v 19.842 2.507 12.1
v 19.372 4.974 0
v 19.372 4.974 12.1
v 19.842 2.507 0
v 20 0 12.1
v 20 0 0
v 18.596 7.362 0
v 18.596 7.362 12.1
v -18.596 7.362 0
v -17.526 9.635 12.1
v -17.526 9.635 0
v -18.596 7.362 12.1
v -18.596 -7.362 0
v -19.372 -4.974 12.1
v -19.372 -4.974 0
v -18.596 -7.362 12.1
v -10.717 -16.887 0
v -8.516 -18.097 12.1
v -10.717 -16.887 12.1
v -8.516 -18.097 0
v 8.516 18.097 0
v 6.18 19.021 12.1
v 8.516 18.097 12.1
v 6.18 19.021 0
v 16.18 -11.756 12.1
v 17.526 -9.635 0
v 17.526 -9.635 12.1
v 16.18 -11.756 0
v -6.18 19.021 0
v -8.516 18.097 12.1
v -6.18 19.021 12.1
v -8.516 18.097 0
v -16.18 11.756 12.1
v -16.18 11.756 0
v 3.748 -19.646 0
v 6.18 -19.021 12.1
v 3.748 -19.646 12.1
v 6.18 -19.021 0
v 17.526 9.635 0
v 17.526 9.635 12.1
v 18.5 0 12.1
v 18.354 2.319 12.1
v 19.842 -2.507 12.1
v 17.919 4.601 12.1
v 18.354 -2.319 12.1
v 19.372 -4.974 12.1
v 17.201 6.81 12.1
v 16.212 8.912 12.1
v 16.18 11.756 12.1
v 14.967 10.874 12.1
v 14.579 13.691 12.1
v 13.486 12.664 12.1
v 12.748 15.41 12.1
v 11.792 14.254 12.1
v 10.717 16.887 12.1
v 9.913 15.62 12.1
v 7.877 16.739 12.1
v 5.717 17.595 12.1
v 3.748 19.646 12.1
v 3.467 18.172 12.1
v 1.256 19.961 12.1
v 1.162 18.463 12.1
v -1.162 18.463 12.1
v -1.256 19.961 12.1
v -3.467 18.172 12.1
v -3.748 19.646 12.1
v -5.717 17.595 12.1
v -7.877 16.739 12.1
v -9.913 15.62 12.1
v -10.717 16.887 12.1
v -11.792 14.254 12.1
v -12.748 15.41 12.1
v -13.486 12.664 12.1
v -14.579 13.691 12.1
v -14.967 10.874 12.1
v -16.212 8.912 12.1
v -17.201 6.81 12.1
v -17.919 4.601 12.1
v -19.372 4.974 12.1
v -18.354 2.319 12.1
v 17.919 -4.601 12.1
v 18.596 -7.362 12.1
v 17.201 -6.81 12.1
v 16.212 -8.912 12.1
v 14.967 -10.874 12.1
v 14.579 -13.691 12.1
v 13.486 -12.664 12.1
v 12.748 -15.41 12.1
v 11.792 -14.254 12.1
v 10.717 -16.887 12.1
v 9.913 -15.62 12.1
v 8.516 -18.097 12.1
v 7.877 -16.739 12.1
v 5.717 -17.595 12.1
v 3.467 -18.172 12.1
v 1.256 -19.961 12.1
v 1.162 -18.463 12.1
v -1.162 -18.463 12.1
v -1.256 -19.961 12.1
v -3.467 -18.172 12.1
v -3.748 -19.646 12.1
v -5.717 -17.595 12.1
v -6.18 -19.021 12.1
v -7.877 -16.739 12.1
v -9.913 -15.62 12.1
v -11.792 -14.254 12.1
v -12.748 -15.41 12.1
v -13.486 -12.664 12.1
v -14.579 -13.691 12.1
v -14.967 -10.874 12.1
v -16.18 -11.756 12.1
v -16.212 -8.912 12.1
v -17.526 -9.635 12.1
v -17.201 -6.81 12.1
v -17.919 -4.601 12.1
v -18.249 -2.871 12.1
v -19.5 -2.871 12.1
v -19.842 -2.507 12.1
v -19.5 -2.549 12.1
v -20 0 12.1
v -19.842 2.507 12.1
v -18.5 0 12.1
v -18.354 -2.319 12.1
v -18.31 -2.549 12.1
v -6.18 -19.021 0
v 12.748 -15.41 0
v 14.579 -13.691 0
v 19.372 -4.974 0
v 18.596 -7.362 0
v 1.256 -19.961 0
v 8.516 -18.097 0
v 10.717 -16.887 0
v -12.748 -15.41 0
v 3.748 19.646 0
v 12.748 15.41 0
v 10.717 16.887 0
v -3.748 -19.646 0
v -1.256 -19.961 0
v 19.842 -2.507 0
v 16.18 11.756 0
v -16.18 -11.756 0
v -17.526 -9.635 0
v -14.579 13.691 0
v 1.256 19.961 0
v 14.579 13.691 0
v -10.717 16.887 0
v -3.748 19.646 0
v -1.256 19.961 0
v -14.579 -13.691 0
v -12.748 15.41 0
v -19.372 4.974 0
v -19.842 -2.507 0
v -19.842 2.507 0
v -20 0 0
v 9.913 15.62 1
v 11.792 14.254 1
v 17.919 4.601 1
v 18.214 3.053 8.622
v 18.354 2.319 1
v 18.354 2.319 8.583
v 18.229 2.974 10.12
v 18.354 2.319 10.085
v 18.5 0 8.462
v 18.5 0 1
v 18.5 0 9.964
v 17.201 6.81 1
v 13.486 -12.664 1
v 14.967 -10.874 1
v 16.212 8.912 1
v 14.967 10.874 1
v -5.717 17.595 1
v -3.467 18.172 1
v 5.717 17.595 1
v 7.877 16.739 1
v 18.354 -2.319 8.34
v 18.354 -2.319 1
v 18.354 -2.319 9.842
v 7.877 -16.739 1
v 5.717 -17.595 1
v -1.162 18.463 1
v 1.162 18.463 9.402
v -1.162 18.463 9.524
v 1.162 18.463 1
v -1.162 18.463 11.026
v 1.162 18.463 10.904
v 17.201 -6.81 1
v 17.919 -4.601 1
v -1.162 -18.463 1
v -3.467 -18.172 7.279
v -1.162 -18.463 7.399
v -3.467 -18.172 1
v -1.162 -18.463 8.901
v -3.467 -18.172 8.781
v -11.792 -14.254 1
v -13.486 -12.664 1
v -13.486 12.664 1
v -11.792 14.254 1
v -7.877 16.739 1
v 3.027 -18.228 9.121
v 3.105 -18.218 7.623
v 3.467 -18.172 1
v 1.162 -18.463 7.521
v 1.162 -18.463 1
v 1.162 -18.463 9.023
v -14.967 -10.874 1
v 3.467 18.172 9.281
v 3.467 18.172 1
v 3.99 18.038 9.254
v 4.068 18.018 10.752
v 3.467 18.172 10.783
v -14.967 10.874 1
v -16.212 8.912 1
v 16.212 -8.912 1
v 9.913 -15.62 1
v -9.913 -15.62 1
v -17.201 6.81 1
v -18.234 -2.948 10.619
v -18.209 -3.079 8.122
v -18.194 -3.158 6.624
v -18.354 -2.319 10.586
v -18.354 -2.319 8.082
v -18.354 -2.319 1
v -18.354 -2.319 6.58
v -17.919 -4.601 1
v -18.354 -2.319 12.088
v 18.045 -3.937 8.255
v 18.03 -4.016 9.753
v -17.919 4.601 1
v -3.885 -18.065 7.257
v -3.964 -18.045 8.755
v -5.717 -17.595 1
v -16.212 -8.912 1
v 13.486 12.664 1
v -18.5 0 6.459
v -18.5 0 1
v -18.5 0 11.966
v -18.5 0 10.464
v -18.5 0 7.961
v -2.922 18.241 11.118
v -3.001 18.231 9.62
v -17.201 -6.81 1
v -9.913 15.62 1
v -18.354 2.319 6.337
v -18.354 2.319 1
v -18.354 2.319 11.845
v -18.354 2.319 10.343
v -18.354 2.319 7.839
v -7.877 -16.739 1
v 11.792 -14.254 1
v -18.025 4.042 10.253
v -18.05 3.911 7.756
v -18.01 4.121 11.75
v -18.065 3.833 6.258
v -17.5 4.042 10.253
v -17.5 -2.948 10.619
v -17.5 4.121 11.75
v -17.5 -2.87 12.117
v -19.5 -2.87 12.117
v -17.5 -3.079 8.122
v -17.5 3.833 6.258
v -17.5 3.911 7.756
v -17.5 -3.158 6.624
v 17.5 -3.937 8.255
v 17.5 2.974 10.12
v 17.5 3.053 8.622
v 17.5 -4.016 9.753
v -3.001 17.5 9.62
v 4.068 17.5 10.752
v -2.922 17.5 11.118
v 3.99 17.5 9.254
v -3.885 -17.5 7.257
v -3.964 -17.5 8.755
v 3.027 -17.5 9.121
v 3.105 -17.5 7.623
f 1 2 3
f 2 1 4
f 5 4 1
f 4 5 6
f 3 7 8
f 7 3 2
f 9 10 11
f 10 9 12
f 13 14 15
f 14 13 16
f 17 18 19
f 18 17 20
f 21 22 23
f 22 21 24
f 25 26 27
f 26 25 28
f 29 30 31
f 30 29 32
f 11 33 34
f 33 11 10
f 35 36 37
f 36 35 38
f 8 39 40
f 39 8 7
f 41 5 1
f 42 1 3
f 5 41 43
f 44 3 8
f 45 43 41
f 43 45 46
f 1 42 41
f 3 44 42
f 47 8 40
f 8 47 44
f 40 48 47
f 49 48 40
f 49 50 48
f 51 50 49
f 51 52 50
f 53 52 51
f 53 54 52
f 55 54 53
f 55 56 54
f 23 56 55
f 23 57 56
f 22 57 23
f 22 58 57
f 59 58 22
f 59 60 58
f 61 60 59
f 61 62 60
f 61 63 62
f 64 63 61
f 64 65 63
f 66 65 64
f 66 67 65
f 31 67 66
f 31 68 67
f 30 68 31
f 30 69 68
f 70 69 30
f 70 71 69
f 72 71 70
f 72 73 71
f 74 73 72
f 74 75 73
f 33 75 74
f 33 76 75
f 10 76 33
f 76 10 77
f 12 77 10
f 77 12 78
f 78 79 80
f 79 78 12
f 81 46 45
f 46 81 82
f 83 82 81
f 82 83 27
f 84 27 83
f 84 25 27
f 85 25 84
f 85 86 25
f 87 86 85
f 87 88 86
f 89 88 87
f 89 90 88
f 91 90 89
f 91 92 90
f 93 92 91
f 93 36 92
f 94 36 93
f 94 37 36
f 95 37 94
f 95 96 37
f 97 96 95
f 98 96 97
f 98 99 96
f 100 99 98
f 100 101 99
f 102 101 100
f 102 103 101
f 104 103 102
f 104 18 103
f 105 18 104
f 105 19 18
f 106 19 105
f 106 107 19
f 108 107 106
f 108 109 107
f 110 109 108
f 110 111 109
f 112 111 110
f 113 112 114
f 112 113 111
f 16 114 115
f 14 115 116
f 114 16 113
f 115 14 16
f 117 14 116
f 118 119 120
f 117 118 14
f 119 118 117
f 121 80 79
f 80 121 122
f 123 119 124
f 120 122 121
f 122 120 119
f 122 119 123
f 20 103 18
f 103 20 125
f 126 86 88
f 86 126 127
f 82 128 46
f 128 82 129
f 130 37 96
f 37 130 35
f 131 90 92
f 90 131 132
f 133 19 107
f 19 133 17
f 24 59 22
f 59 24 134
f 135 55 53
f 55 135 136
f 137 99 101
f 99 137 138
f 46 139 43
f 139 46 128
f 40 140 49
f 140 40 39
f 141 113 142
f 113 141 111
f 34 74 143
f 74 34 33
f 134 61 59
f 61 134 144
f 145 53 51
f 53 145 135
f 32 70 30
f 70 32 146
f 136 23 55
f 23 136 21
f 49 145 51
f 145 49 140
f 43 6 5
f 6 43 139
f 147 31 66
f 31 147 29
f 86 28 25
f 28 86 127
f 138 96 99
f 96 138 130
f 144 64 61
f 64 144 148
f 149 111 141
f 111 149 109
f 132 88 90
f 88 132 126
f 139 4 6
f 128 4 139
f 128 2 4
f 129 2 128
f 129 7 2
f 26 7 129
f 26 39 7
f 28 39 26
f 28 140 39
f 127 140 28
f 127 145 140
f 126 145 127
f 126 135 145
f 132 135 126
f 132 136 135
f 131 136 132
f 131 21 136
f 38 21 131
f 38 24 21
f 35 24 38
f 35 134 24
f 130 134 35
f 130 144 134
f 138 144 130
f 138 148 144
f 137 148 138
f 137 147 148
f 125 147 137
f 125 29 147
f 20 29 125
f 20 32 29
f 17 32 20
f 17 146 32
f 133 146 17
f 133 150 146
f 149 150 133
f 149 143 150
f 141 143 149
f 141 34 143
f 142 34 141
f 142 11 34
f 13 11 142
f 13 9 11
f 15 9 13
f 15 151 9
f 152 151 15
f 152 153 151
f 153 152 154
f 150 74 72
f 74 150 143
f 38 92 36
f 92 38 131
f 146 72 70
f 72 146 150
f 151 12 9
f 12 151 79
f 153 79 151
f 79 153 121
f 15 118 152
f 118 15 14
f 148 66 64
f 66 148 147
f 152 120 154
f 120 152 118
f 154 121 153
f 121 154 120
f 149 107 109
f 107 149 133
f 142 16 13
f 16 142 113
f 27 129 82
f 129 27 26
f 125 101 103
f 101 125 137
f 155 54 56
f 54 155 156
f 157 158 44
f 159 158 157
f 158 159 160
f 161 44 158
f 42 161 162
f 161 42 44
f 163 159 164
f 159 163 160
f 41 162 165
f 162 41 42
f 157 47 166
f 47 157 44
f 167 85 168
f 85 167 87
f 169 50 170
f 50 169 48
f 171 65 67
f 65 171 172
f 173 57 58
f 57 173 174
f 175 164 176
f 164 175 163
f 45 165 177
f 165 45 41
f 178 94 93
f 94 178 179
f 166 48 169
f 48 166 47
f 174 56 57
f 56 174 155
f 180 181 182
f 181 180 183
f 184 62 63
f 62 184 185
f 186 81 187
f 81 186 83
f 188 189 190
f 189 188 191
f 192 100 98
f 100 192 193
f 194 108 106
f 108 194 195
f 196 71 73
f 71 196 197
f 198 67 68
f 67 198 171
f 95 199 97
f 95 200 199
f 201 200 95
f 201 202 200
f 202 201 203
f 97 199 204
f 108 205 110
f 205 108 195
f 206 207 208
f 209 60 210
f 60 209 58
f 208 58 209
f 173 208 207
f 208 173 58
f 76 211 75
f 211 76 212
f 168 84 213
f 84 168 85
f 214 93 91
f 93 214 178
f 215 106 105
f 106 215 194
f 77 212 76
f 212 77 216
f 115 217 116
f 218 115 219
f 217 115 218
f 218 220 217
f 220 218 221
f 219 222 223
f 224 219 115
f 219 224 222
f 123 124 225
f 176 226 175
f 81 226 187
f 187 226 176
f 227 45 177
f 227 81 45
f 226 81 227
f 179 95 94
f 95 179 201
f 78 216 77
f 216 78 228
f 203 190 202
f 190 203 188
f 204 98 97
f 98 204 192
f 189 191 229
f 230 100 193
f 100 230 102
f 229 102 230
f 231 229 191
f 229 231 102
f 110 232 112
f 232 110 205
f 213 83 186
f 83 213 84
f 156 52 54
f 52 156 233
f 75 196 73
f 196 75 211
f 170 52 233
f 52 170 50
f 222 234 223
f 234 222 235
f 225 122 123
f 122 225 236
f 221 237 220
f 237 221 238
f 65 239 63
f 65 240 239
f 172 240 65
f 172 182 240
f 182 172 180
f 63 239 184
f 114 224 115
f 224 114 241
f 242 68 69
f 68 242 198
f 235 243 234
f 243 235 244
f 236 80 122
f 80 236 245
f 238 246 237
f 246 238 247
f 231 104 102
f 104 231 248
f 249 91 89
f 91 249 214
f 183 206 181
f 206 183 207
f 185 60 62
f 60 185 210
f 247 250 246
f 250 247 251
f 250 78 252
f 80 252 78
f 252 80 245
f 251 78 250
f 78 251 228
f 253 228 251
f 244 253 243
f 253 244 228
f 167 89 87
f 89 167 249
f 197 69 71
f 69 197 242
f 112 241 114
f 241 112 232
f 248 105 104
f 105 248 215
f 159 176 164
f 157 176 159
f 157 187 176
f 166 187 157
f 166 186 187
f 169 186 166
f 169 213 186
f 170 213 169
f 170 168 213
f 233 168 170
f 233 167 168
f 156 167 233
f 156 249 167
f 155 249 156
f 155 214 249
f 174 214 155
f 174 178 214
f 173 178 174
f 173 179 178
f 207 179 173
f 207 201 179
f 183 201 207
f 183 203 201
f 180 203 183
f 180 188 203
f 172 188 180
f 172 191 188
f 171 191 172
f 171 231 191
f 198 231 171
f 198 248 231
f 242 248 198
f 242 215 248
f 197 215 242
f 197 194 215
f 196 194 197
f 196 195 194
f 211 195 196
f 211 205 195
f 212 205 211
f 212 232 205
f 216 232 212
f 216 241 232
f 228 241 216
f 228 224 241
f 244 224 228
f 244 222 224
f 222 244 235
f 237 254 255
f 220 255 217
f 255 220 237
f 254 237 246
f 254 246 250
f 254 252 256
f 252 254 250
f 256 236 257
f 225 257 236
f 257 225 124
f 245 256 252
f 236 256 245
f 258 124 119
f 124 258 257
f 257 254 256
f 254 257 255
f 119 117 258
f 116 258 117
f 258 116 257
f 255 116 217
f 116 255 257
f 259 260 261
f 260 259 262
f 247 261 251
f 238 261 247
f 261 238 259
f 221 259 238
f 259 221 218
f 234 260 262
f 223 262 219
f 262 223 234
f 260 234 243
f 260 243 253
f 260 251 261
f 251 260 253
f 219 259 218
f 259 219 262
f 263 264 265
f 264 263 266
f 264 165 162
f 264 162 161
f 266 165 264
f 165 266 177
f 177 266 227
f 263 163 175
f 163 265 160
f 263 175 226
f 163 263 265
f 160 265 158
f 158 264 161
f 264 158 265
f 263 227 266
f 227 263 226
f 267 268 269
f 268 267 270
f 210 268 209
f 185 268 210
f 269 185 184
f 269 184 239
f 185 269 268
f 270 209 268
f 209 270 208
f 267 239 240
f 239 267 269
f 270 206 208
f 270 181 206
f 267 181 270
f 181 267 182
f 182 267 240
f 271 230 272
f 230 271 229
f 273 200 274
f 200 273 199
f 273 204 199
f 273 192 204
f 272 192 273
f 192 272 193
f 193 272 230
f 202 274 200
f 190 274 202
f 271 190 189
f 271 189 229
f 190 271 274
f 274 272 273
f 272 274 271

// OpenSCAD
$fn=50+0;
/* [Cap Type] */
type="solid"; // [coin,hole,solid]
/* [Option Dimensions] */
//dimentions of optional coin slot
slotL=25;
slotW=3;
//diameter of optional hole
holeDia=8;
/* [Hidden] */
height=12.1;
innerDia=37;
outerDia=40;

difference(){
translate([0,0,height/2]) cylinder(d=outerDia,h=height,center=true);
translate([0,0,(height/2)+1]) cylinder(d=innerDia,h=height,center=true);

if (type=="coin") cube([slotL,slotW,10],true);
if (type=="hole") cylinder(d=holeDia,h=10,center=true);
};
rotate([-3,0,0]) translate([-(innerDia/2),0,11.2]) cube([2,7,1.5],true);
rotate([-3,0,0]) translate([-(innerDia/2),0,7.2]) cube([2,7,1.5],true);

rotate([3,0,0]) translate([(innerDia/2),0,9.2]) cube([2,7,1.5],true);

rotate([0,3,0]) translate([0,(innerDia/2),10.2]) cube([7,2,1.5],true);
rotate([0,-3,0]) translate([0,-(innerDia/2),8.2]) cube([7,2,1.5],true);
